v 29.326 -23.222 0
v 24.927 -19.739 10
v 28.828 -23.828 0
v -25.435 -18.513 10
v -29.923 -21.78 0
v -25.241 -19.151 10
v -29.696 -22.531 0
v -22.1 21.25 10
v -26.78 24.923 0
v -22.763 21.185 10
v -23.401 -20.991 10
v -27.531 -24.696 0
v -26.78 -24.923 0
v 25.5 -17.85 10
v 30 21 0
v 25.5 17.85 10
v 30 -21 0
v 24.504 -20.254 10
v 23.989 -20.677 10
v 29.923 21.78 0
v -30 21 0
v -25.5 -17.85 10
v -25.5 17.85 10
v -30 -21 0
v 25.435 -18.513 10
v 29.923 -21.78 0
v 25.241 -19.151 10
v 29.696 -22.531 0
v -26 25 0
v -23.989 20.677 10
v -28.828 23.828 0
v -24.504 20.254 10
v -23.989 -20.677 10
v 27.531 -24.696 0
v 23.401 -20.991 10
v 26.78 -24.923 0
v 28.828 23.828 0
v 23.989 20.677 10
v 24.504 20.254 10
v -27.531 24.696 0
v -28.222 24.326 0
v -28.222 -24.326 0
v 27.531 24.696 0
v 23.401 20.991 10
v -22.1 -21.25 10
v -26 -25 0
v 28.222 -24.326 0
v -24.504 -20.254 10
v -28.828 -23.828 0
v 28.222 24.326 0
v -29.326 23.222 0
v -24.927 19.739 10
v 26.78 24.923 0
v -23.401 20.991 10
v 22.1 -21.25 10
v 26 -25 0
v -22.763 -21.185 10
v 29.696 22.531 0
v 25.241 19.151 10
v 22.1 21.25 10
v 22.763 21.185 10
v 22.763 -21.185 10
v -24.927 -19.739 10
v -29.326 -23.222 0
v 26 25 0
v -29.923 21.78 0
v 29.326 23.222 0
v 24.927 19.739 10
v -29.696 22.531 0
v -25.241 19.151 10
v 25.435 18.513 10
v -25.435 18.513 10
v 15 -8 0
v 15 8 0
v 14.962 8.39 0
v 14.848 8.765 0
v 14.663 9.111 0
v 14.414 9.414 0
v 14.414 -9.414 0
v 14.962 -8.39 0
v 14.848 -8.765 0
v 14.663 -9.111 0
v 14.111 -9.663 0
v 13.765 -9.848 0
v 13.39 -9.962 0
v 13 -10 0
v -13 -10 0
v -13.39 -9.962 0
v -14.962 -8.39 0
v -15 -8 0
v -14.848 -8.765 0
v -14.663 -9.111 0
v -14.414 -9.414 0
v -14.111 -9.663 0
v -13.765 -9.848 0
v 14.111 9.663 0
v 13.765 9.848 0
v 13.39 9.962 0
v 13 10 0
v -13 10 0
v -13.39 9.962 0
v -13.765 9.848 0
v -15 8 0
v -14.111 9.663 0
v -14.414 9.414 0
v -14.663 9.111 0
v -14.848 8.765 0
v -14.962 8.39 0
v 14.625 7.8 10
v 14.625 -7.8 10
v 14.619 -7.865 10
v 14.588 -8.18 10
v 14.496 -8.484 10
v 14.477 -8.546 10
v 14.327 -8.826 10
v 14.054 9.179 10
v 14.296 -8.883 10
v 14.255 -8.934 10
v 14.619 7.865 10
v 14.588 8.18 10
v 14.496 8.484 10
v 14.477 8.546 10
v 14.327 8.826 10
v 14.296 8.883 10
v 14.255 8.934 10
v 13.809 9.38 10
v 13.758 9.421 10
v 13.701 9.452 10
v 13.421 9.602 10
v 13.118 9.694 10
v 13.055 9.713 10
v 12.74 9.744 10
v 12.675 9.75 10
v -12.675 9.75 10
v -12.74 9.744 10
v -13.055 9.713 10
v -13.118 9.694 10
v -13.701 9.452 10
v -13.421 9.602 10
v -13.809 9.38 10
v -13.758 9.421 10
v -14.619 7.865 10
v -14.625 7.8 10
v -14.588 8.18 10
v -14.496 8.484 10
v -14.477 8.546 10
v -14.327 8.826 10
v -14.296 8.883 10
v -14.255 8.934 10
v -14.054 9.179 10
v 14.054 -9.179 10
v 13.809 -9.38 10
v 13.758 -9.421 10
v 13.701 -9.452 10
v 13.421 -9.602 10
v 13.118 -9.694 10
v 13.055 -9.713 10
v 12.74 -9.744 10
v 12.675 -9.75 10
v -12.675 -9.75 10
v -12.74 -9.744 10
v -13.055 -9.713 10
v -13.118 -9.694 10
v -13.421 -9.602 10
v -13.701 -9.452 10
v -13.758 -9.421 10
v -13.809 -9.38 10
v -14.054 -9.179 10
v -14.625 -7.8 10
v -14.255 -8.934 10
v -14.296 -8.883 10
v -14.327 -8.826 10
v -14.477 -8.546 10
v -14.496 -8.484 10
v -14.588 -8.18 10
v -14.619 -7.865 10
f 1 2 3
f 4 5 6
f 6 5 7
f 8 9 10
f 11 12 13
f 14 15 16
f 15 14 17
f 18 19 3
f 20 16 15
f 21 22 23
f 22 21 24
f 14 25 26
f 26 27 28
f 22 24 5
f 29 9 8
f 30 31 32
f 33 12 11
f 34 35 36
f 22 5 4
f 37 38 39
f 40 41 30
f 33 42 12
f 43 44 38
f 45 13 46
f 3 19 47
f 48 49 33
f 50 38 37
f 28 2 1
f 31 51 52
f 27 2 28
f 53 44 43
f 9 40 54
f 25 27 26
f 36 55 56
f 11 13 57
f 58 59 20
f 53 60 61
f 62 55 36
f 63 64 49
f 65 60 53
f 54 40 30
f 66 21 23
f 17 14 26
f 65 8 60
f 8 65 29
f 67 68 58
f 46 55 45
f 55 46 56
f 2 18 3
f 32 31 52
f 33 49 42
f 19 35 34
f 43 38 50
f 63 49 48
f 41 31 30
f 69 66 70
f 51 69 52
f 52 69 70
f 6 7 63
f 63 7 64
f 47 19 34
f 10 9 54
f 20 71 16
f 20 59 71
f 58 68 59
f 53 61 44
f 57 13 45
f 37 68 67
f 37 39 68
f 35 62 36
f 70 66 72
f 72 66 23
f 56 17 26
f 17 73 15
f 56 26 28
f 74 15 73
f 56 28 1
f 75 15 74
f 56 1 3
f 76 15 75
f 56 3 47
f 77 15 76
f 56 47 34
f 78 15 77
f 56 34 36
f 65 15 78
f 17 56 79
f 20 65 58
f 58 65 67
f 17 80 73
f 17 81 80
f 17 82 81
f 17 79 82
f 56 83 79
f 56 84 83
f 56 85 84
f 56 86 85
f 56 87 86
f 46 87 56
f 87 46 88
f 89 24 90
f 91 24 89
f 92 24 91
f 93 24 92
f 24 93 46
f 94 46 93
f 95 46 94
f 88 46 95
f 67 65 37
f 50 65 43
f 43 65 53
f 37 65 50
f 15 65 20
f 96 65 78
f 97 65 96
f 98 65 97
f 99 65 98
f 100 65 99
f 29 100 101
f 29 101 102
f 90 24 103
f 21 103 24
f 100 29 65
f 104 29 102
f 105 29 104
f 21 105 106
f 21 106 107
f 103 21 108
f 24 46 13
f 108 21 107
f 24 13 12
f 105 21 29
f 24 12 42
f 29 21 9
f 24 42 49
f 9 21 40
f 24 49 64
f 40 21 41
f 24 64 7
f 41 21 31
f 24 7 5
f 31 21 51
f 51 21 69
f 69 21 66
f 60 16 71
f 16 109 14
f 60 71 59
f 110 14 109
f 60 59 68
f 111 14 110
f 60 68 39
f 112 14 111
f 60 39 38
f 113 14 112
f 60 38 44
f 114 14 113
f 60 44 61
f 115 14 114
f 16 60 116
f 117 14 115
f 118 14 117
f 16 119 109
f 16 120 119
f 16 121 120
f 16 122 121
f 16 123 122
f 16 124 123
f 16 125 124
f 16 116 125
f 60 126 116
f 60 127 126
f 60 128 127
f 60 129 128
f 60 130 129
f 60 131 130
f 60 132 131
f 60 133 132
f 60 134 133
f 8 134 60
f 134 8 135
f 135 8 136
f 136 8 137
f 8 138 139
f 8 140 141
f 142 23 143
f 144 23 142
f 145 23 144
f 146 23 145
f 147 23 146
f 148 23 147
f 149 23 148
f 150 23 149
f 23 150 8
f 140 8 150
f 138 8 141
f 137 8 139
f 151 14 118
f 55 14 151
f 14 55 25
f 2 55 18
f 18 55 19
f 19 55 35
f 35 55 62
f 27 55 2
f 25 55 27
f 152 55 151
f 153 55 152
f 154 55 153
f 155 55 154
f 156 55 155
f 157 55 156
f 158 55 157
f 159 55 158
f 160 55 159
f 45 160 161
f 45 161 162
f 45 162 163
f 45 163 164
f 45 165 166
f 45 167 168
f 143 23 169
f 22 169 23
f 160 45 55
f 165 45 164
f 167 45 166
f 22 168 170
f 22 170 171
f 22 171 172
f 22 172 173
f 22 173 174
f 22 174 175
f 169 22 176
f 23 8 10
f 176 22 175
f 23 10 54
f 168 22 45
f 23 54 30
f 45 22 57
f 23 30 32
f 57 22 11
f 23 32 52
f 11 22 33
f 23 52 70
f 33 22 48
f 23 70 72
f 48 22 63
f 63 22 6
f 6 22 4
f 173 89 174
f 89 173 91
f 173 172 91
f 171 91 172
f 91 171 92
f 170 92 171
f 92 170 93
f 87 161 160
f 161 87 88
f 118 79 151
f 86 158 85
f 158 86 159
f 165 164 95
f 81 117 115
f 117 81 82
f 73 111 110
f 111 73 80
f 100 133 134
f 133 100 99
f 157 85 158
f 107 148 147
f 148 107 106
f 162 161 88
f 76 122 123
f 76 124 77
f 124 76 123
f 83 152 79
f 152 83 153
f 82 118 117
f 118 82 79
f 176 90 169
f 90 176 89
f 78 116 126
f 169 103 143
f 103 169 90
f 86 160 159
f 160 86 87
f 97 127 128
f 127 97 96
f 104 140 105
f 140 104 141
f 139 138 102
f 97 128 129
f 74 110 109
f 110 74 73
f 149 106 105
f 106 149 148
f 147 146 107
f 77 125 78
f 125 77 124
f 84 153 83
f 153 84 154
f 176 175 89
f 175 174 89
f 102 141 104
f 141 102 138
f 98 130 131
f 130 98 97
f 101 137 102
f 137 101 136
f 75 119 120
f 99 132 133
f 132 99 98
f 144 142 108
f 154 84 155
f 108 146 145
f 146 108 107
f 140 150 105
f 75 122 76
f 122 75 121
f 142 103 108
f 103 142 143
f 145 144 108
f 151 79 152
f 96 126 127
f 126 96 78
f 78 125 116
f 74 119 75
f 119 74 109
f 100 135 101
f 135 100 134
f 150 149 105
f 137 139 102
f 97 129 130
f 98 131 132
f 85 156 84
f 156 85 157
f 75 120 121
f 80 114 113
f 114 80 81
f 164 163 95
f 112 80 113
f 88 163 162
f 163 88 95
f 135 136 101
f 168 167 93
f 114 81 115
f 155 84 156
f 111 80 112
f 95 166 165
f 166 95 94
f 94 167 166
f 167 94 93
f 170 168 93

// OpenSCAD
$fn = 32;

// ----------------------------------------------------------------------
// Display bezel: 60 x 50 mm frame, opening 30x20 mm
// ----------------------------------------------------------------------

// --- parameters (mm) ---
length = 60;              // frame outside length, X
width = 50;               // frame outside width, Y
frame_w = 15;             // frame width
thickness = 10;           // frame thickness
corner_r = 4;             // outside corner radius
chamfer = 0.85;           // outer wall taper
funnel = 0.97;            // inner opening taper
opening_l = 30;           // opening length
opening_w = 20;           // opening width
inner_r = 2;              // opening corner radius

/* rounded-rectangle outlines, generated with loops */
module rounded_ring(l_nom, w_nom, r) {
  hull() {
    for (sx = [-1, 1]) for (sy = [-1, 1])
      translate([sx * (l_nom / 2 - r), sy * (w_nom / 2 - r)]) circle(r = r);
  }
}

difference() {
  /* frame body, drafted so the outer edge is a variable-depth chamfer */
  linear_extrude(height = thickness, scale = chamfer)
    rounded_ring(length, width, corner_r);
  /* viewing opening, drafted the other way for a funnel edge */
  linear_extrude(height = thickness + 2, scale = funnel)
    translate([0, 0, -1]) rounded_ring(opening_l, opening_w, inner_r);
}
